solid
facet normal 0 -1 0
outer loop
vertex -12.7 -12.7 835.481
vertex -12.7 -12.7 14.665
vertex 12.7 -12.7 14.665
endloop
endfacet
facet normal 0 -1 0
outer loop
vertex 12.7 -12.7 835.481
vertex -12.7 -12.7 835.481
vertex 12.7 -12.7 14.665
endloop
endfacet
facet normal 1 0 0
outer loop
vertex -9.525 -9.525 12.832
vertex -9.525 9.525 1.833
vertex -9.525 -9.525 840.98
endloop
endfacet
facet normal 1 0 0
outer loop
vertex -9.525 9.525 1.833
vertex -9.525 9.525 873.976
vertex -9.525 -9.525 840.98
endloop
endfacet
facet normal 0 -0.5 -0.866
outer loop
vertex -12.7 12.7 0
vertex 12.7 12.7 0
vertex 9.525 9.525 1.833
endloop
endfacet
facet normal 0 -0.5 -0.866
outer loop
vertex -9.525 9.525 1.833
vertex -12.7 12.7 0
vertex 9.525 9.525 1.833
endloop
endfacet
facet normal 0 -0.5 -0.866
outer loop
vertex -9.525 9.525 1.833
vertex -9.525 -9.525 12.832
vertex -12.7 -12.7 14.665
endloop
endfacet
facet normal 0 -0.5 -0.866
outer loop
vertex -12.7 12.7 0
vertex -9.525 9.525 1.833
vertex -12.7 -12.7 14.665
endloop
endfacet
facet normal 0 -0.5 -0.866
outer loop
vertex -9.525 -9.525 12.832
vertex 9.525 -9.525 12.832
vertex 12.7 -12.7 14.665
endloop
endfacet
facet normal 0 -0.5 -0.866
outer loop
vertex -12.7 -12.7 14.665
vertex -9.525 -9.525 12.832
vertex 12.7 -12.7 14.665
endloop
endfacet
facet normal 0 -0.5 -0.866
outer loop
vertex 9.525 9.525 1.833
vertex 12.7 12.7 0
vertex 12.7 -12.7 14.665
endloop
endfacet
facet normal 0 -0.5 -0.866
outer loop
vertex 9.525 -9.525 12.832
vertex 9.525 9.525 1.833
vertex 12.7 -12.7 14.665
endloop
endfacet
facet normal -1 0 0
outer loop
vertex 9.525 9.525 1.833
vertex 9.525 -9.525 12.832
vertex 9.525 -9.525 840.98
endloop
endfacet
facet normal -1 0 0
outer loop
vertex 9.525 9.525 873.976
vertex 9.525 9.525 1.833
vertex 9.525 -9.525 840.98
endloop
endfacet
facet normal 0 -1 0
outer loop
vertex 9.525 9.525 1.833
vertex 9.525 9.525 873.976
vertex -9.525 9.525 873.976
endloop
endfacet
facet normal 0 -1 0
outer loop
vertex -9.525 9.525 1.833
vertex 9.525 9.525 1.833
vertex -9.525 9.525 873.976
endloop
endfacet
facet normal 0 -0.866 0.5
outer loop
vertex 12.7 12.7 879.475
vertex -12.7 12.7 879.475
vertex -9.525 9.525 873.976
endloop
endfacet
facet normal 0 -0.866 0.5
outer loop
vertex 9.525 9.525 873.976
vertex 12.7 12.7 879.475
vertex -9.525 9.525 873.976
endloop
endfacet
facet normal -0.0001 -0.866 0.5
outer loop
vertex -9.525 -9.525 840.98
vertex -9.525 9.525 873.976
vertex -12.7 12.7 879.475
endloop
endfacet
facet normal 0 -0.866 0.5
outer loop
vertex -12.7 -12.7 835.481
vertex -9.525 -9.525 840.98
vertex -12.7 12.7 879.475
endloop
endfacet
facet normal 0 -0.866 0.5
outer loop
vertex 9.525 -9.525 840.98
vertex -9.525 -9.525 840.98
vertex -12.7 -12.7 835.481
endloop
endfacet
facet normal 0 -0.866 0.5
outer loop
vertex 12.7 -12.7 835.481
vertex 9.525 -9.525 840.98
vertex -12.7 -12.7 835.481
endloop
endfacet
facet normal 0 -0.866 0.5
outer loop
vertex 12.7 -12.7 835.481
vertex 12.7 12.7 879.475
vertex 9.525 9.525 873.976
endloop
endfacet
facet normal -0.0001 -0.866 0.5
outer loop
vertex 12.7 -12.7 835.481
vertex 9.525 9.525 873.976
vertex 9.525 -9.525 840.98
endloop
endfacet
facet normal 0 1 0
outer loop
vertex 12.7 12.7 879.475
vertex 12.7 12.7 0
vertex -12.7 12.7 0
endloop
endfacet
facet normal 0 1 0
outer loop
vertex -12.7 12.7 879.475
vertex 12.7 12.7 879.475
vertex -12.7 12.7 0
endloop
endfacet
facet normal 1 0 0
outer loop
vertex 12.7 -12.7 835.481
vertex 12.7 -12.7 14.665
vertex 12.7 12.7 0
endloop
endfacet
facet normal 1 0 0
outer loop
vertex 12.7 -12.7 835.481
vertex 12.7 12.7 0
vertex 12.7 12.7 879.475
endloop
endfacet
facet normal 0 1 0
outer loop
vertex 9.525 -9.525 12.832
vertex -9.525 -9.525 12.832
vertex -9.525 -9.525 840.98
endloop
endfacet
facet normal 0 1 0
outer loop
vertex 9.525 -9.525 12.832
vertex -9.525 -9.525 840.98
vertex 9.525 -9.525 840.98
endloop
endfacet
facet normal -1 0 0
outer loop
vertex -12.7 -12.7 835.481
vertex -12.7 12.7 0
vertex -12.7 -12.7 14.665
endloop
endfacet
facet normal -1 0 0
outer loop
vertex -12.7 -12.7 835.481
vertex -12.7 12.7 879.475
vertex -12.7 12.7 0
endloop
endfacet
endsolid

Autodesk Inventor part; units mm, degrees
ref_plane "YZ Plane" through (0, 0, 0) normal (1, 0, 0) x (0, 1, 0)
ref_plane "XZ Plane" through (0, 0, 0) normal (0, 1, 0) x (-1, 0, 0)
ref_plane "XY Plane" through (0, 0, 0) normal (0, 0, 1) x (1, 0, 0)
sketch "Sketch1" plane through (0, 0, 0) normal (0, 0, 1) x (1, 0, 0)
  line L0 (-12.7, -12.7) -> (12.7, -12.7)
  line L1 (12.7, -12.7) -> (12.7, 12.7)
  line L2 (12.7, 12.7) -> (-12.7, 12.7)
  line L3 (-12.7, 12.7) -> (-12.7, -12.7)
  line L4 (-12.7, -12.7) -> (12.7, 12.7) construction
  line L5 (12.7, -12.7) -> (-12.7, 12.7) construction
  line L6 (-9.525, -9.525) -> (9.525, -9.525)
  line L7 (9.525, -9.525) -> (9.525, 9.525)
  line L8 (9.525, 9.525) -> (-9.525, 9.525)
  line L9 (-9.525, 9.525) -> (-9.525, -9.525)
  line L10 (-9.525, -9.525) -> (9.525, 9.525) construction
  line L11 (9.525, -9.525) -> (-9.525, 9.525) construction
  point P0 (0, 0)
  dimension "d0" = 25.4
  dimension "d1" = 25.4
  dimension "d2" = 3.175
extrude "Extrusion1" add sketch "Sketch1" along normal blind 879.475
sketch "Sketch2" plane through (12.7, -12.7, 0) normal (1, 0, 0) x (0, 0, -1)
  line L0 (0, 0) -> (0, 25.4) projected
  line L1 (0, 25.4) -> (-14.6647, 0)
  line L2 (0, 0) -> (-879.475, 0) projected
  line L3 (0, 0) -> (0, 25.4)
  line L4 (-14.6647, 0) -> (0, 0)
  point P0 (0, 12.7)
  dimension "d10" = 60
extrude "Extrusion2" cut sketch "Sketch2" against normal through all
sketch "Sketch3" plane through (12.7, -12.7, 879.475) normal (1, 0, 0) x (0, 0, -1)
  line L0 (879.475, 25.4) -> (0, 25.4) projected
  line L1 (0, 25.4) -> (43.9941, 0)
  line L2 (864.8103, 0) -> (0, 0) projected
  line L3 (0, 0) -> (0, 25.4)
  line L4 (0, 3.175) -> (0, 22.225) projected
  line L5 (43.9941, 0) -> (0, 0)
  point P0 (879.475, 12.7)
  dimension "d7" = 30
extrude "Extrusion3" cut sketch "Sketch3" against normal through all
properties part number "hypotAluminumExtrusion"
